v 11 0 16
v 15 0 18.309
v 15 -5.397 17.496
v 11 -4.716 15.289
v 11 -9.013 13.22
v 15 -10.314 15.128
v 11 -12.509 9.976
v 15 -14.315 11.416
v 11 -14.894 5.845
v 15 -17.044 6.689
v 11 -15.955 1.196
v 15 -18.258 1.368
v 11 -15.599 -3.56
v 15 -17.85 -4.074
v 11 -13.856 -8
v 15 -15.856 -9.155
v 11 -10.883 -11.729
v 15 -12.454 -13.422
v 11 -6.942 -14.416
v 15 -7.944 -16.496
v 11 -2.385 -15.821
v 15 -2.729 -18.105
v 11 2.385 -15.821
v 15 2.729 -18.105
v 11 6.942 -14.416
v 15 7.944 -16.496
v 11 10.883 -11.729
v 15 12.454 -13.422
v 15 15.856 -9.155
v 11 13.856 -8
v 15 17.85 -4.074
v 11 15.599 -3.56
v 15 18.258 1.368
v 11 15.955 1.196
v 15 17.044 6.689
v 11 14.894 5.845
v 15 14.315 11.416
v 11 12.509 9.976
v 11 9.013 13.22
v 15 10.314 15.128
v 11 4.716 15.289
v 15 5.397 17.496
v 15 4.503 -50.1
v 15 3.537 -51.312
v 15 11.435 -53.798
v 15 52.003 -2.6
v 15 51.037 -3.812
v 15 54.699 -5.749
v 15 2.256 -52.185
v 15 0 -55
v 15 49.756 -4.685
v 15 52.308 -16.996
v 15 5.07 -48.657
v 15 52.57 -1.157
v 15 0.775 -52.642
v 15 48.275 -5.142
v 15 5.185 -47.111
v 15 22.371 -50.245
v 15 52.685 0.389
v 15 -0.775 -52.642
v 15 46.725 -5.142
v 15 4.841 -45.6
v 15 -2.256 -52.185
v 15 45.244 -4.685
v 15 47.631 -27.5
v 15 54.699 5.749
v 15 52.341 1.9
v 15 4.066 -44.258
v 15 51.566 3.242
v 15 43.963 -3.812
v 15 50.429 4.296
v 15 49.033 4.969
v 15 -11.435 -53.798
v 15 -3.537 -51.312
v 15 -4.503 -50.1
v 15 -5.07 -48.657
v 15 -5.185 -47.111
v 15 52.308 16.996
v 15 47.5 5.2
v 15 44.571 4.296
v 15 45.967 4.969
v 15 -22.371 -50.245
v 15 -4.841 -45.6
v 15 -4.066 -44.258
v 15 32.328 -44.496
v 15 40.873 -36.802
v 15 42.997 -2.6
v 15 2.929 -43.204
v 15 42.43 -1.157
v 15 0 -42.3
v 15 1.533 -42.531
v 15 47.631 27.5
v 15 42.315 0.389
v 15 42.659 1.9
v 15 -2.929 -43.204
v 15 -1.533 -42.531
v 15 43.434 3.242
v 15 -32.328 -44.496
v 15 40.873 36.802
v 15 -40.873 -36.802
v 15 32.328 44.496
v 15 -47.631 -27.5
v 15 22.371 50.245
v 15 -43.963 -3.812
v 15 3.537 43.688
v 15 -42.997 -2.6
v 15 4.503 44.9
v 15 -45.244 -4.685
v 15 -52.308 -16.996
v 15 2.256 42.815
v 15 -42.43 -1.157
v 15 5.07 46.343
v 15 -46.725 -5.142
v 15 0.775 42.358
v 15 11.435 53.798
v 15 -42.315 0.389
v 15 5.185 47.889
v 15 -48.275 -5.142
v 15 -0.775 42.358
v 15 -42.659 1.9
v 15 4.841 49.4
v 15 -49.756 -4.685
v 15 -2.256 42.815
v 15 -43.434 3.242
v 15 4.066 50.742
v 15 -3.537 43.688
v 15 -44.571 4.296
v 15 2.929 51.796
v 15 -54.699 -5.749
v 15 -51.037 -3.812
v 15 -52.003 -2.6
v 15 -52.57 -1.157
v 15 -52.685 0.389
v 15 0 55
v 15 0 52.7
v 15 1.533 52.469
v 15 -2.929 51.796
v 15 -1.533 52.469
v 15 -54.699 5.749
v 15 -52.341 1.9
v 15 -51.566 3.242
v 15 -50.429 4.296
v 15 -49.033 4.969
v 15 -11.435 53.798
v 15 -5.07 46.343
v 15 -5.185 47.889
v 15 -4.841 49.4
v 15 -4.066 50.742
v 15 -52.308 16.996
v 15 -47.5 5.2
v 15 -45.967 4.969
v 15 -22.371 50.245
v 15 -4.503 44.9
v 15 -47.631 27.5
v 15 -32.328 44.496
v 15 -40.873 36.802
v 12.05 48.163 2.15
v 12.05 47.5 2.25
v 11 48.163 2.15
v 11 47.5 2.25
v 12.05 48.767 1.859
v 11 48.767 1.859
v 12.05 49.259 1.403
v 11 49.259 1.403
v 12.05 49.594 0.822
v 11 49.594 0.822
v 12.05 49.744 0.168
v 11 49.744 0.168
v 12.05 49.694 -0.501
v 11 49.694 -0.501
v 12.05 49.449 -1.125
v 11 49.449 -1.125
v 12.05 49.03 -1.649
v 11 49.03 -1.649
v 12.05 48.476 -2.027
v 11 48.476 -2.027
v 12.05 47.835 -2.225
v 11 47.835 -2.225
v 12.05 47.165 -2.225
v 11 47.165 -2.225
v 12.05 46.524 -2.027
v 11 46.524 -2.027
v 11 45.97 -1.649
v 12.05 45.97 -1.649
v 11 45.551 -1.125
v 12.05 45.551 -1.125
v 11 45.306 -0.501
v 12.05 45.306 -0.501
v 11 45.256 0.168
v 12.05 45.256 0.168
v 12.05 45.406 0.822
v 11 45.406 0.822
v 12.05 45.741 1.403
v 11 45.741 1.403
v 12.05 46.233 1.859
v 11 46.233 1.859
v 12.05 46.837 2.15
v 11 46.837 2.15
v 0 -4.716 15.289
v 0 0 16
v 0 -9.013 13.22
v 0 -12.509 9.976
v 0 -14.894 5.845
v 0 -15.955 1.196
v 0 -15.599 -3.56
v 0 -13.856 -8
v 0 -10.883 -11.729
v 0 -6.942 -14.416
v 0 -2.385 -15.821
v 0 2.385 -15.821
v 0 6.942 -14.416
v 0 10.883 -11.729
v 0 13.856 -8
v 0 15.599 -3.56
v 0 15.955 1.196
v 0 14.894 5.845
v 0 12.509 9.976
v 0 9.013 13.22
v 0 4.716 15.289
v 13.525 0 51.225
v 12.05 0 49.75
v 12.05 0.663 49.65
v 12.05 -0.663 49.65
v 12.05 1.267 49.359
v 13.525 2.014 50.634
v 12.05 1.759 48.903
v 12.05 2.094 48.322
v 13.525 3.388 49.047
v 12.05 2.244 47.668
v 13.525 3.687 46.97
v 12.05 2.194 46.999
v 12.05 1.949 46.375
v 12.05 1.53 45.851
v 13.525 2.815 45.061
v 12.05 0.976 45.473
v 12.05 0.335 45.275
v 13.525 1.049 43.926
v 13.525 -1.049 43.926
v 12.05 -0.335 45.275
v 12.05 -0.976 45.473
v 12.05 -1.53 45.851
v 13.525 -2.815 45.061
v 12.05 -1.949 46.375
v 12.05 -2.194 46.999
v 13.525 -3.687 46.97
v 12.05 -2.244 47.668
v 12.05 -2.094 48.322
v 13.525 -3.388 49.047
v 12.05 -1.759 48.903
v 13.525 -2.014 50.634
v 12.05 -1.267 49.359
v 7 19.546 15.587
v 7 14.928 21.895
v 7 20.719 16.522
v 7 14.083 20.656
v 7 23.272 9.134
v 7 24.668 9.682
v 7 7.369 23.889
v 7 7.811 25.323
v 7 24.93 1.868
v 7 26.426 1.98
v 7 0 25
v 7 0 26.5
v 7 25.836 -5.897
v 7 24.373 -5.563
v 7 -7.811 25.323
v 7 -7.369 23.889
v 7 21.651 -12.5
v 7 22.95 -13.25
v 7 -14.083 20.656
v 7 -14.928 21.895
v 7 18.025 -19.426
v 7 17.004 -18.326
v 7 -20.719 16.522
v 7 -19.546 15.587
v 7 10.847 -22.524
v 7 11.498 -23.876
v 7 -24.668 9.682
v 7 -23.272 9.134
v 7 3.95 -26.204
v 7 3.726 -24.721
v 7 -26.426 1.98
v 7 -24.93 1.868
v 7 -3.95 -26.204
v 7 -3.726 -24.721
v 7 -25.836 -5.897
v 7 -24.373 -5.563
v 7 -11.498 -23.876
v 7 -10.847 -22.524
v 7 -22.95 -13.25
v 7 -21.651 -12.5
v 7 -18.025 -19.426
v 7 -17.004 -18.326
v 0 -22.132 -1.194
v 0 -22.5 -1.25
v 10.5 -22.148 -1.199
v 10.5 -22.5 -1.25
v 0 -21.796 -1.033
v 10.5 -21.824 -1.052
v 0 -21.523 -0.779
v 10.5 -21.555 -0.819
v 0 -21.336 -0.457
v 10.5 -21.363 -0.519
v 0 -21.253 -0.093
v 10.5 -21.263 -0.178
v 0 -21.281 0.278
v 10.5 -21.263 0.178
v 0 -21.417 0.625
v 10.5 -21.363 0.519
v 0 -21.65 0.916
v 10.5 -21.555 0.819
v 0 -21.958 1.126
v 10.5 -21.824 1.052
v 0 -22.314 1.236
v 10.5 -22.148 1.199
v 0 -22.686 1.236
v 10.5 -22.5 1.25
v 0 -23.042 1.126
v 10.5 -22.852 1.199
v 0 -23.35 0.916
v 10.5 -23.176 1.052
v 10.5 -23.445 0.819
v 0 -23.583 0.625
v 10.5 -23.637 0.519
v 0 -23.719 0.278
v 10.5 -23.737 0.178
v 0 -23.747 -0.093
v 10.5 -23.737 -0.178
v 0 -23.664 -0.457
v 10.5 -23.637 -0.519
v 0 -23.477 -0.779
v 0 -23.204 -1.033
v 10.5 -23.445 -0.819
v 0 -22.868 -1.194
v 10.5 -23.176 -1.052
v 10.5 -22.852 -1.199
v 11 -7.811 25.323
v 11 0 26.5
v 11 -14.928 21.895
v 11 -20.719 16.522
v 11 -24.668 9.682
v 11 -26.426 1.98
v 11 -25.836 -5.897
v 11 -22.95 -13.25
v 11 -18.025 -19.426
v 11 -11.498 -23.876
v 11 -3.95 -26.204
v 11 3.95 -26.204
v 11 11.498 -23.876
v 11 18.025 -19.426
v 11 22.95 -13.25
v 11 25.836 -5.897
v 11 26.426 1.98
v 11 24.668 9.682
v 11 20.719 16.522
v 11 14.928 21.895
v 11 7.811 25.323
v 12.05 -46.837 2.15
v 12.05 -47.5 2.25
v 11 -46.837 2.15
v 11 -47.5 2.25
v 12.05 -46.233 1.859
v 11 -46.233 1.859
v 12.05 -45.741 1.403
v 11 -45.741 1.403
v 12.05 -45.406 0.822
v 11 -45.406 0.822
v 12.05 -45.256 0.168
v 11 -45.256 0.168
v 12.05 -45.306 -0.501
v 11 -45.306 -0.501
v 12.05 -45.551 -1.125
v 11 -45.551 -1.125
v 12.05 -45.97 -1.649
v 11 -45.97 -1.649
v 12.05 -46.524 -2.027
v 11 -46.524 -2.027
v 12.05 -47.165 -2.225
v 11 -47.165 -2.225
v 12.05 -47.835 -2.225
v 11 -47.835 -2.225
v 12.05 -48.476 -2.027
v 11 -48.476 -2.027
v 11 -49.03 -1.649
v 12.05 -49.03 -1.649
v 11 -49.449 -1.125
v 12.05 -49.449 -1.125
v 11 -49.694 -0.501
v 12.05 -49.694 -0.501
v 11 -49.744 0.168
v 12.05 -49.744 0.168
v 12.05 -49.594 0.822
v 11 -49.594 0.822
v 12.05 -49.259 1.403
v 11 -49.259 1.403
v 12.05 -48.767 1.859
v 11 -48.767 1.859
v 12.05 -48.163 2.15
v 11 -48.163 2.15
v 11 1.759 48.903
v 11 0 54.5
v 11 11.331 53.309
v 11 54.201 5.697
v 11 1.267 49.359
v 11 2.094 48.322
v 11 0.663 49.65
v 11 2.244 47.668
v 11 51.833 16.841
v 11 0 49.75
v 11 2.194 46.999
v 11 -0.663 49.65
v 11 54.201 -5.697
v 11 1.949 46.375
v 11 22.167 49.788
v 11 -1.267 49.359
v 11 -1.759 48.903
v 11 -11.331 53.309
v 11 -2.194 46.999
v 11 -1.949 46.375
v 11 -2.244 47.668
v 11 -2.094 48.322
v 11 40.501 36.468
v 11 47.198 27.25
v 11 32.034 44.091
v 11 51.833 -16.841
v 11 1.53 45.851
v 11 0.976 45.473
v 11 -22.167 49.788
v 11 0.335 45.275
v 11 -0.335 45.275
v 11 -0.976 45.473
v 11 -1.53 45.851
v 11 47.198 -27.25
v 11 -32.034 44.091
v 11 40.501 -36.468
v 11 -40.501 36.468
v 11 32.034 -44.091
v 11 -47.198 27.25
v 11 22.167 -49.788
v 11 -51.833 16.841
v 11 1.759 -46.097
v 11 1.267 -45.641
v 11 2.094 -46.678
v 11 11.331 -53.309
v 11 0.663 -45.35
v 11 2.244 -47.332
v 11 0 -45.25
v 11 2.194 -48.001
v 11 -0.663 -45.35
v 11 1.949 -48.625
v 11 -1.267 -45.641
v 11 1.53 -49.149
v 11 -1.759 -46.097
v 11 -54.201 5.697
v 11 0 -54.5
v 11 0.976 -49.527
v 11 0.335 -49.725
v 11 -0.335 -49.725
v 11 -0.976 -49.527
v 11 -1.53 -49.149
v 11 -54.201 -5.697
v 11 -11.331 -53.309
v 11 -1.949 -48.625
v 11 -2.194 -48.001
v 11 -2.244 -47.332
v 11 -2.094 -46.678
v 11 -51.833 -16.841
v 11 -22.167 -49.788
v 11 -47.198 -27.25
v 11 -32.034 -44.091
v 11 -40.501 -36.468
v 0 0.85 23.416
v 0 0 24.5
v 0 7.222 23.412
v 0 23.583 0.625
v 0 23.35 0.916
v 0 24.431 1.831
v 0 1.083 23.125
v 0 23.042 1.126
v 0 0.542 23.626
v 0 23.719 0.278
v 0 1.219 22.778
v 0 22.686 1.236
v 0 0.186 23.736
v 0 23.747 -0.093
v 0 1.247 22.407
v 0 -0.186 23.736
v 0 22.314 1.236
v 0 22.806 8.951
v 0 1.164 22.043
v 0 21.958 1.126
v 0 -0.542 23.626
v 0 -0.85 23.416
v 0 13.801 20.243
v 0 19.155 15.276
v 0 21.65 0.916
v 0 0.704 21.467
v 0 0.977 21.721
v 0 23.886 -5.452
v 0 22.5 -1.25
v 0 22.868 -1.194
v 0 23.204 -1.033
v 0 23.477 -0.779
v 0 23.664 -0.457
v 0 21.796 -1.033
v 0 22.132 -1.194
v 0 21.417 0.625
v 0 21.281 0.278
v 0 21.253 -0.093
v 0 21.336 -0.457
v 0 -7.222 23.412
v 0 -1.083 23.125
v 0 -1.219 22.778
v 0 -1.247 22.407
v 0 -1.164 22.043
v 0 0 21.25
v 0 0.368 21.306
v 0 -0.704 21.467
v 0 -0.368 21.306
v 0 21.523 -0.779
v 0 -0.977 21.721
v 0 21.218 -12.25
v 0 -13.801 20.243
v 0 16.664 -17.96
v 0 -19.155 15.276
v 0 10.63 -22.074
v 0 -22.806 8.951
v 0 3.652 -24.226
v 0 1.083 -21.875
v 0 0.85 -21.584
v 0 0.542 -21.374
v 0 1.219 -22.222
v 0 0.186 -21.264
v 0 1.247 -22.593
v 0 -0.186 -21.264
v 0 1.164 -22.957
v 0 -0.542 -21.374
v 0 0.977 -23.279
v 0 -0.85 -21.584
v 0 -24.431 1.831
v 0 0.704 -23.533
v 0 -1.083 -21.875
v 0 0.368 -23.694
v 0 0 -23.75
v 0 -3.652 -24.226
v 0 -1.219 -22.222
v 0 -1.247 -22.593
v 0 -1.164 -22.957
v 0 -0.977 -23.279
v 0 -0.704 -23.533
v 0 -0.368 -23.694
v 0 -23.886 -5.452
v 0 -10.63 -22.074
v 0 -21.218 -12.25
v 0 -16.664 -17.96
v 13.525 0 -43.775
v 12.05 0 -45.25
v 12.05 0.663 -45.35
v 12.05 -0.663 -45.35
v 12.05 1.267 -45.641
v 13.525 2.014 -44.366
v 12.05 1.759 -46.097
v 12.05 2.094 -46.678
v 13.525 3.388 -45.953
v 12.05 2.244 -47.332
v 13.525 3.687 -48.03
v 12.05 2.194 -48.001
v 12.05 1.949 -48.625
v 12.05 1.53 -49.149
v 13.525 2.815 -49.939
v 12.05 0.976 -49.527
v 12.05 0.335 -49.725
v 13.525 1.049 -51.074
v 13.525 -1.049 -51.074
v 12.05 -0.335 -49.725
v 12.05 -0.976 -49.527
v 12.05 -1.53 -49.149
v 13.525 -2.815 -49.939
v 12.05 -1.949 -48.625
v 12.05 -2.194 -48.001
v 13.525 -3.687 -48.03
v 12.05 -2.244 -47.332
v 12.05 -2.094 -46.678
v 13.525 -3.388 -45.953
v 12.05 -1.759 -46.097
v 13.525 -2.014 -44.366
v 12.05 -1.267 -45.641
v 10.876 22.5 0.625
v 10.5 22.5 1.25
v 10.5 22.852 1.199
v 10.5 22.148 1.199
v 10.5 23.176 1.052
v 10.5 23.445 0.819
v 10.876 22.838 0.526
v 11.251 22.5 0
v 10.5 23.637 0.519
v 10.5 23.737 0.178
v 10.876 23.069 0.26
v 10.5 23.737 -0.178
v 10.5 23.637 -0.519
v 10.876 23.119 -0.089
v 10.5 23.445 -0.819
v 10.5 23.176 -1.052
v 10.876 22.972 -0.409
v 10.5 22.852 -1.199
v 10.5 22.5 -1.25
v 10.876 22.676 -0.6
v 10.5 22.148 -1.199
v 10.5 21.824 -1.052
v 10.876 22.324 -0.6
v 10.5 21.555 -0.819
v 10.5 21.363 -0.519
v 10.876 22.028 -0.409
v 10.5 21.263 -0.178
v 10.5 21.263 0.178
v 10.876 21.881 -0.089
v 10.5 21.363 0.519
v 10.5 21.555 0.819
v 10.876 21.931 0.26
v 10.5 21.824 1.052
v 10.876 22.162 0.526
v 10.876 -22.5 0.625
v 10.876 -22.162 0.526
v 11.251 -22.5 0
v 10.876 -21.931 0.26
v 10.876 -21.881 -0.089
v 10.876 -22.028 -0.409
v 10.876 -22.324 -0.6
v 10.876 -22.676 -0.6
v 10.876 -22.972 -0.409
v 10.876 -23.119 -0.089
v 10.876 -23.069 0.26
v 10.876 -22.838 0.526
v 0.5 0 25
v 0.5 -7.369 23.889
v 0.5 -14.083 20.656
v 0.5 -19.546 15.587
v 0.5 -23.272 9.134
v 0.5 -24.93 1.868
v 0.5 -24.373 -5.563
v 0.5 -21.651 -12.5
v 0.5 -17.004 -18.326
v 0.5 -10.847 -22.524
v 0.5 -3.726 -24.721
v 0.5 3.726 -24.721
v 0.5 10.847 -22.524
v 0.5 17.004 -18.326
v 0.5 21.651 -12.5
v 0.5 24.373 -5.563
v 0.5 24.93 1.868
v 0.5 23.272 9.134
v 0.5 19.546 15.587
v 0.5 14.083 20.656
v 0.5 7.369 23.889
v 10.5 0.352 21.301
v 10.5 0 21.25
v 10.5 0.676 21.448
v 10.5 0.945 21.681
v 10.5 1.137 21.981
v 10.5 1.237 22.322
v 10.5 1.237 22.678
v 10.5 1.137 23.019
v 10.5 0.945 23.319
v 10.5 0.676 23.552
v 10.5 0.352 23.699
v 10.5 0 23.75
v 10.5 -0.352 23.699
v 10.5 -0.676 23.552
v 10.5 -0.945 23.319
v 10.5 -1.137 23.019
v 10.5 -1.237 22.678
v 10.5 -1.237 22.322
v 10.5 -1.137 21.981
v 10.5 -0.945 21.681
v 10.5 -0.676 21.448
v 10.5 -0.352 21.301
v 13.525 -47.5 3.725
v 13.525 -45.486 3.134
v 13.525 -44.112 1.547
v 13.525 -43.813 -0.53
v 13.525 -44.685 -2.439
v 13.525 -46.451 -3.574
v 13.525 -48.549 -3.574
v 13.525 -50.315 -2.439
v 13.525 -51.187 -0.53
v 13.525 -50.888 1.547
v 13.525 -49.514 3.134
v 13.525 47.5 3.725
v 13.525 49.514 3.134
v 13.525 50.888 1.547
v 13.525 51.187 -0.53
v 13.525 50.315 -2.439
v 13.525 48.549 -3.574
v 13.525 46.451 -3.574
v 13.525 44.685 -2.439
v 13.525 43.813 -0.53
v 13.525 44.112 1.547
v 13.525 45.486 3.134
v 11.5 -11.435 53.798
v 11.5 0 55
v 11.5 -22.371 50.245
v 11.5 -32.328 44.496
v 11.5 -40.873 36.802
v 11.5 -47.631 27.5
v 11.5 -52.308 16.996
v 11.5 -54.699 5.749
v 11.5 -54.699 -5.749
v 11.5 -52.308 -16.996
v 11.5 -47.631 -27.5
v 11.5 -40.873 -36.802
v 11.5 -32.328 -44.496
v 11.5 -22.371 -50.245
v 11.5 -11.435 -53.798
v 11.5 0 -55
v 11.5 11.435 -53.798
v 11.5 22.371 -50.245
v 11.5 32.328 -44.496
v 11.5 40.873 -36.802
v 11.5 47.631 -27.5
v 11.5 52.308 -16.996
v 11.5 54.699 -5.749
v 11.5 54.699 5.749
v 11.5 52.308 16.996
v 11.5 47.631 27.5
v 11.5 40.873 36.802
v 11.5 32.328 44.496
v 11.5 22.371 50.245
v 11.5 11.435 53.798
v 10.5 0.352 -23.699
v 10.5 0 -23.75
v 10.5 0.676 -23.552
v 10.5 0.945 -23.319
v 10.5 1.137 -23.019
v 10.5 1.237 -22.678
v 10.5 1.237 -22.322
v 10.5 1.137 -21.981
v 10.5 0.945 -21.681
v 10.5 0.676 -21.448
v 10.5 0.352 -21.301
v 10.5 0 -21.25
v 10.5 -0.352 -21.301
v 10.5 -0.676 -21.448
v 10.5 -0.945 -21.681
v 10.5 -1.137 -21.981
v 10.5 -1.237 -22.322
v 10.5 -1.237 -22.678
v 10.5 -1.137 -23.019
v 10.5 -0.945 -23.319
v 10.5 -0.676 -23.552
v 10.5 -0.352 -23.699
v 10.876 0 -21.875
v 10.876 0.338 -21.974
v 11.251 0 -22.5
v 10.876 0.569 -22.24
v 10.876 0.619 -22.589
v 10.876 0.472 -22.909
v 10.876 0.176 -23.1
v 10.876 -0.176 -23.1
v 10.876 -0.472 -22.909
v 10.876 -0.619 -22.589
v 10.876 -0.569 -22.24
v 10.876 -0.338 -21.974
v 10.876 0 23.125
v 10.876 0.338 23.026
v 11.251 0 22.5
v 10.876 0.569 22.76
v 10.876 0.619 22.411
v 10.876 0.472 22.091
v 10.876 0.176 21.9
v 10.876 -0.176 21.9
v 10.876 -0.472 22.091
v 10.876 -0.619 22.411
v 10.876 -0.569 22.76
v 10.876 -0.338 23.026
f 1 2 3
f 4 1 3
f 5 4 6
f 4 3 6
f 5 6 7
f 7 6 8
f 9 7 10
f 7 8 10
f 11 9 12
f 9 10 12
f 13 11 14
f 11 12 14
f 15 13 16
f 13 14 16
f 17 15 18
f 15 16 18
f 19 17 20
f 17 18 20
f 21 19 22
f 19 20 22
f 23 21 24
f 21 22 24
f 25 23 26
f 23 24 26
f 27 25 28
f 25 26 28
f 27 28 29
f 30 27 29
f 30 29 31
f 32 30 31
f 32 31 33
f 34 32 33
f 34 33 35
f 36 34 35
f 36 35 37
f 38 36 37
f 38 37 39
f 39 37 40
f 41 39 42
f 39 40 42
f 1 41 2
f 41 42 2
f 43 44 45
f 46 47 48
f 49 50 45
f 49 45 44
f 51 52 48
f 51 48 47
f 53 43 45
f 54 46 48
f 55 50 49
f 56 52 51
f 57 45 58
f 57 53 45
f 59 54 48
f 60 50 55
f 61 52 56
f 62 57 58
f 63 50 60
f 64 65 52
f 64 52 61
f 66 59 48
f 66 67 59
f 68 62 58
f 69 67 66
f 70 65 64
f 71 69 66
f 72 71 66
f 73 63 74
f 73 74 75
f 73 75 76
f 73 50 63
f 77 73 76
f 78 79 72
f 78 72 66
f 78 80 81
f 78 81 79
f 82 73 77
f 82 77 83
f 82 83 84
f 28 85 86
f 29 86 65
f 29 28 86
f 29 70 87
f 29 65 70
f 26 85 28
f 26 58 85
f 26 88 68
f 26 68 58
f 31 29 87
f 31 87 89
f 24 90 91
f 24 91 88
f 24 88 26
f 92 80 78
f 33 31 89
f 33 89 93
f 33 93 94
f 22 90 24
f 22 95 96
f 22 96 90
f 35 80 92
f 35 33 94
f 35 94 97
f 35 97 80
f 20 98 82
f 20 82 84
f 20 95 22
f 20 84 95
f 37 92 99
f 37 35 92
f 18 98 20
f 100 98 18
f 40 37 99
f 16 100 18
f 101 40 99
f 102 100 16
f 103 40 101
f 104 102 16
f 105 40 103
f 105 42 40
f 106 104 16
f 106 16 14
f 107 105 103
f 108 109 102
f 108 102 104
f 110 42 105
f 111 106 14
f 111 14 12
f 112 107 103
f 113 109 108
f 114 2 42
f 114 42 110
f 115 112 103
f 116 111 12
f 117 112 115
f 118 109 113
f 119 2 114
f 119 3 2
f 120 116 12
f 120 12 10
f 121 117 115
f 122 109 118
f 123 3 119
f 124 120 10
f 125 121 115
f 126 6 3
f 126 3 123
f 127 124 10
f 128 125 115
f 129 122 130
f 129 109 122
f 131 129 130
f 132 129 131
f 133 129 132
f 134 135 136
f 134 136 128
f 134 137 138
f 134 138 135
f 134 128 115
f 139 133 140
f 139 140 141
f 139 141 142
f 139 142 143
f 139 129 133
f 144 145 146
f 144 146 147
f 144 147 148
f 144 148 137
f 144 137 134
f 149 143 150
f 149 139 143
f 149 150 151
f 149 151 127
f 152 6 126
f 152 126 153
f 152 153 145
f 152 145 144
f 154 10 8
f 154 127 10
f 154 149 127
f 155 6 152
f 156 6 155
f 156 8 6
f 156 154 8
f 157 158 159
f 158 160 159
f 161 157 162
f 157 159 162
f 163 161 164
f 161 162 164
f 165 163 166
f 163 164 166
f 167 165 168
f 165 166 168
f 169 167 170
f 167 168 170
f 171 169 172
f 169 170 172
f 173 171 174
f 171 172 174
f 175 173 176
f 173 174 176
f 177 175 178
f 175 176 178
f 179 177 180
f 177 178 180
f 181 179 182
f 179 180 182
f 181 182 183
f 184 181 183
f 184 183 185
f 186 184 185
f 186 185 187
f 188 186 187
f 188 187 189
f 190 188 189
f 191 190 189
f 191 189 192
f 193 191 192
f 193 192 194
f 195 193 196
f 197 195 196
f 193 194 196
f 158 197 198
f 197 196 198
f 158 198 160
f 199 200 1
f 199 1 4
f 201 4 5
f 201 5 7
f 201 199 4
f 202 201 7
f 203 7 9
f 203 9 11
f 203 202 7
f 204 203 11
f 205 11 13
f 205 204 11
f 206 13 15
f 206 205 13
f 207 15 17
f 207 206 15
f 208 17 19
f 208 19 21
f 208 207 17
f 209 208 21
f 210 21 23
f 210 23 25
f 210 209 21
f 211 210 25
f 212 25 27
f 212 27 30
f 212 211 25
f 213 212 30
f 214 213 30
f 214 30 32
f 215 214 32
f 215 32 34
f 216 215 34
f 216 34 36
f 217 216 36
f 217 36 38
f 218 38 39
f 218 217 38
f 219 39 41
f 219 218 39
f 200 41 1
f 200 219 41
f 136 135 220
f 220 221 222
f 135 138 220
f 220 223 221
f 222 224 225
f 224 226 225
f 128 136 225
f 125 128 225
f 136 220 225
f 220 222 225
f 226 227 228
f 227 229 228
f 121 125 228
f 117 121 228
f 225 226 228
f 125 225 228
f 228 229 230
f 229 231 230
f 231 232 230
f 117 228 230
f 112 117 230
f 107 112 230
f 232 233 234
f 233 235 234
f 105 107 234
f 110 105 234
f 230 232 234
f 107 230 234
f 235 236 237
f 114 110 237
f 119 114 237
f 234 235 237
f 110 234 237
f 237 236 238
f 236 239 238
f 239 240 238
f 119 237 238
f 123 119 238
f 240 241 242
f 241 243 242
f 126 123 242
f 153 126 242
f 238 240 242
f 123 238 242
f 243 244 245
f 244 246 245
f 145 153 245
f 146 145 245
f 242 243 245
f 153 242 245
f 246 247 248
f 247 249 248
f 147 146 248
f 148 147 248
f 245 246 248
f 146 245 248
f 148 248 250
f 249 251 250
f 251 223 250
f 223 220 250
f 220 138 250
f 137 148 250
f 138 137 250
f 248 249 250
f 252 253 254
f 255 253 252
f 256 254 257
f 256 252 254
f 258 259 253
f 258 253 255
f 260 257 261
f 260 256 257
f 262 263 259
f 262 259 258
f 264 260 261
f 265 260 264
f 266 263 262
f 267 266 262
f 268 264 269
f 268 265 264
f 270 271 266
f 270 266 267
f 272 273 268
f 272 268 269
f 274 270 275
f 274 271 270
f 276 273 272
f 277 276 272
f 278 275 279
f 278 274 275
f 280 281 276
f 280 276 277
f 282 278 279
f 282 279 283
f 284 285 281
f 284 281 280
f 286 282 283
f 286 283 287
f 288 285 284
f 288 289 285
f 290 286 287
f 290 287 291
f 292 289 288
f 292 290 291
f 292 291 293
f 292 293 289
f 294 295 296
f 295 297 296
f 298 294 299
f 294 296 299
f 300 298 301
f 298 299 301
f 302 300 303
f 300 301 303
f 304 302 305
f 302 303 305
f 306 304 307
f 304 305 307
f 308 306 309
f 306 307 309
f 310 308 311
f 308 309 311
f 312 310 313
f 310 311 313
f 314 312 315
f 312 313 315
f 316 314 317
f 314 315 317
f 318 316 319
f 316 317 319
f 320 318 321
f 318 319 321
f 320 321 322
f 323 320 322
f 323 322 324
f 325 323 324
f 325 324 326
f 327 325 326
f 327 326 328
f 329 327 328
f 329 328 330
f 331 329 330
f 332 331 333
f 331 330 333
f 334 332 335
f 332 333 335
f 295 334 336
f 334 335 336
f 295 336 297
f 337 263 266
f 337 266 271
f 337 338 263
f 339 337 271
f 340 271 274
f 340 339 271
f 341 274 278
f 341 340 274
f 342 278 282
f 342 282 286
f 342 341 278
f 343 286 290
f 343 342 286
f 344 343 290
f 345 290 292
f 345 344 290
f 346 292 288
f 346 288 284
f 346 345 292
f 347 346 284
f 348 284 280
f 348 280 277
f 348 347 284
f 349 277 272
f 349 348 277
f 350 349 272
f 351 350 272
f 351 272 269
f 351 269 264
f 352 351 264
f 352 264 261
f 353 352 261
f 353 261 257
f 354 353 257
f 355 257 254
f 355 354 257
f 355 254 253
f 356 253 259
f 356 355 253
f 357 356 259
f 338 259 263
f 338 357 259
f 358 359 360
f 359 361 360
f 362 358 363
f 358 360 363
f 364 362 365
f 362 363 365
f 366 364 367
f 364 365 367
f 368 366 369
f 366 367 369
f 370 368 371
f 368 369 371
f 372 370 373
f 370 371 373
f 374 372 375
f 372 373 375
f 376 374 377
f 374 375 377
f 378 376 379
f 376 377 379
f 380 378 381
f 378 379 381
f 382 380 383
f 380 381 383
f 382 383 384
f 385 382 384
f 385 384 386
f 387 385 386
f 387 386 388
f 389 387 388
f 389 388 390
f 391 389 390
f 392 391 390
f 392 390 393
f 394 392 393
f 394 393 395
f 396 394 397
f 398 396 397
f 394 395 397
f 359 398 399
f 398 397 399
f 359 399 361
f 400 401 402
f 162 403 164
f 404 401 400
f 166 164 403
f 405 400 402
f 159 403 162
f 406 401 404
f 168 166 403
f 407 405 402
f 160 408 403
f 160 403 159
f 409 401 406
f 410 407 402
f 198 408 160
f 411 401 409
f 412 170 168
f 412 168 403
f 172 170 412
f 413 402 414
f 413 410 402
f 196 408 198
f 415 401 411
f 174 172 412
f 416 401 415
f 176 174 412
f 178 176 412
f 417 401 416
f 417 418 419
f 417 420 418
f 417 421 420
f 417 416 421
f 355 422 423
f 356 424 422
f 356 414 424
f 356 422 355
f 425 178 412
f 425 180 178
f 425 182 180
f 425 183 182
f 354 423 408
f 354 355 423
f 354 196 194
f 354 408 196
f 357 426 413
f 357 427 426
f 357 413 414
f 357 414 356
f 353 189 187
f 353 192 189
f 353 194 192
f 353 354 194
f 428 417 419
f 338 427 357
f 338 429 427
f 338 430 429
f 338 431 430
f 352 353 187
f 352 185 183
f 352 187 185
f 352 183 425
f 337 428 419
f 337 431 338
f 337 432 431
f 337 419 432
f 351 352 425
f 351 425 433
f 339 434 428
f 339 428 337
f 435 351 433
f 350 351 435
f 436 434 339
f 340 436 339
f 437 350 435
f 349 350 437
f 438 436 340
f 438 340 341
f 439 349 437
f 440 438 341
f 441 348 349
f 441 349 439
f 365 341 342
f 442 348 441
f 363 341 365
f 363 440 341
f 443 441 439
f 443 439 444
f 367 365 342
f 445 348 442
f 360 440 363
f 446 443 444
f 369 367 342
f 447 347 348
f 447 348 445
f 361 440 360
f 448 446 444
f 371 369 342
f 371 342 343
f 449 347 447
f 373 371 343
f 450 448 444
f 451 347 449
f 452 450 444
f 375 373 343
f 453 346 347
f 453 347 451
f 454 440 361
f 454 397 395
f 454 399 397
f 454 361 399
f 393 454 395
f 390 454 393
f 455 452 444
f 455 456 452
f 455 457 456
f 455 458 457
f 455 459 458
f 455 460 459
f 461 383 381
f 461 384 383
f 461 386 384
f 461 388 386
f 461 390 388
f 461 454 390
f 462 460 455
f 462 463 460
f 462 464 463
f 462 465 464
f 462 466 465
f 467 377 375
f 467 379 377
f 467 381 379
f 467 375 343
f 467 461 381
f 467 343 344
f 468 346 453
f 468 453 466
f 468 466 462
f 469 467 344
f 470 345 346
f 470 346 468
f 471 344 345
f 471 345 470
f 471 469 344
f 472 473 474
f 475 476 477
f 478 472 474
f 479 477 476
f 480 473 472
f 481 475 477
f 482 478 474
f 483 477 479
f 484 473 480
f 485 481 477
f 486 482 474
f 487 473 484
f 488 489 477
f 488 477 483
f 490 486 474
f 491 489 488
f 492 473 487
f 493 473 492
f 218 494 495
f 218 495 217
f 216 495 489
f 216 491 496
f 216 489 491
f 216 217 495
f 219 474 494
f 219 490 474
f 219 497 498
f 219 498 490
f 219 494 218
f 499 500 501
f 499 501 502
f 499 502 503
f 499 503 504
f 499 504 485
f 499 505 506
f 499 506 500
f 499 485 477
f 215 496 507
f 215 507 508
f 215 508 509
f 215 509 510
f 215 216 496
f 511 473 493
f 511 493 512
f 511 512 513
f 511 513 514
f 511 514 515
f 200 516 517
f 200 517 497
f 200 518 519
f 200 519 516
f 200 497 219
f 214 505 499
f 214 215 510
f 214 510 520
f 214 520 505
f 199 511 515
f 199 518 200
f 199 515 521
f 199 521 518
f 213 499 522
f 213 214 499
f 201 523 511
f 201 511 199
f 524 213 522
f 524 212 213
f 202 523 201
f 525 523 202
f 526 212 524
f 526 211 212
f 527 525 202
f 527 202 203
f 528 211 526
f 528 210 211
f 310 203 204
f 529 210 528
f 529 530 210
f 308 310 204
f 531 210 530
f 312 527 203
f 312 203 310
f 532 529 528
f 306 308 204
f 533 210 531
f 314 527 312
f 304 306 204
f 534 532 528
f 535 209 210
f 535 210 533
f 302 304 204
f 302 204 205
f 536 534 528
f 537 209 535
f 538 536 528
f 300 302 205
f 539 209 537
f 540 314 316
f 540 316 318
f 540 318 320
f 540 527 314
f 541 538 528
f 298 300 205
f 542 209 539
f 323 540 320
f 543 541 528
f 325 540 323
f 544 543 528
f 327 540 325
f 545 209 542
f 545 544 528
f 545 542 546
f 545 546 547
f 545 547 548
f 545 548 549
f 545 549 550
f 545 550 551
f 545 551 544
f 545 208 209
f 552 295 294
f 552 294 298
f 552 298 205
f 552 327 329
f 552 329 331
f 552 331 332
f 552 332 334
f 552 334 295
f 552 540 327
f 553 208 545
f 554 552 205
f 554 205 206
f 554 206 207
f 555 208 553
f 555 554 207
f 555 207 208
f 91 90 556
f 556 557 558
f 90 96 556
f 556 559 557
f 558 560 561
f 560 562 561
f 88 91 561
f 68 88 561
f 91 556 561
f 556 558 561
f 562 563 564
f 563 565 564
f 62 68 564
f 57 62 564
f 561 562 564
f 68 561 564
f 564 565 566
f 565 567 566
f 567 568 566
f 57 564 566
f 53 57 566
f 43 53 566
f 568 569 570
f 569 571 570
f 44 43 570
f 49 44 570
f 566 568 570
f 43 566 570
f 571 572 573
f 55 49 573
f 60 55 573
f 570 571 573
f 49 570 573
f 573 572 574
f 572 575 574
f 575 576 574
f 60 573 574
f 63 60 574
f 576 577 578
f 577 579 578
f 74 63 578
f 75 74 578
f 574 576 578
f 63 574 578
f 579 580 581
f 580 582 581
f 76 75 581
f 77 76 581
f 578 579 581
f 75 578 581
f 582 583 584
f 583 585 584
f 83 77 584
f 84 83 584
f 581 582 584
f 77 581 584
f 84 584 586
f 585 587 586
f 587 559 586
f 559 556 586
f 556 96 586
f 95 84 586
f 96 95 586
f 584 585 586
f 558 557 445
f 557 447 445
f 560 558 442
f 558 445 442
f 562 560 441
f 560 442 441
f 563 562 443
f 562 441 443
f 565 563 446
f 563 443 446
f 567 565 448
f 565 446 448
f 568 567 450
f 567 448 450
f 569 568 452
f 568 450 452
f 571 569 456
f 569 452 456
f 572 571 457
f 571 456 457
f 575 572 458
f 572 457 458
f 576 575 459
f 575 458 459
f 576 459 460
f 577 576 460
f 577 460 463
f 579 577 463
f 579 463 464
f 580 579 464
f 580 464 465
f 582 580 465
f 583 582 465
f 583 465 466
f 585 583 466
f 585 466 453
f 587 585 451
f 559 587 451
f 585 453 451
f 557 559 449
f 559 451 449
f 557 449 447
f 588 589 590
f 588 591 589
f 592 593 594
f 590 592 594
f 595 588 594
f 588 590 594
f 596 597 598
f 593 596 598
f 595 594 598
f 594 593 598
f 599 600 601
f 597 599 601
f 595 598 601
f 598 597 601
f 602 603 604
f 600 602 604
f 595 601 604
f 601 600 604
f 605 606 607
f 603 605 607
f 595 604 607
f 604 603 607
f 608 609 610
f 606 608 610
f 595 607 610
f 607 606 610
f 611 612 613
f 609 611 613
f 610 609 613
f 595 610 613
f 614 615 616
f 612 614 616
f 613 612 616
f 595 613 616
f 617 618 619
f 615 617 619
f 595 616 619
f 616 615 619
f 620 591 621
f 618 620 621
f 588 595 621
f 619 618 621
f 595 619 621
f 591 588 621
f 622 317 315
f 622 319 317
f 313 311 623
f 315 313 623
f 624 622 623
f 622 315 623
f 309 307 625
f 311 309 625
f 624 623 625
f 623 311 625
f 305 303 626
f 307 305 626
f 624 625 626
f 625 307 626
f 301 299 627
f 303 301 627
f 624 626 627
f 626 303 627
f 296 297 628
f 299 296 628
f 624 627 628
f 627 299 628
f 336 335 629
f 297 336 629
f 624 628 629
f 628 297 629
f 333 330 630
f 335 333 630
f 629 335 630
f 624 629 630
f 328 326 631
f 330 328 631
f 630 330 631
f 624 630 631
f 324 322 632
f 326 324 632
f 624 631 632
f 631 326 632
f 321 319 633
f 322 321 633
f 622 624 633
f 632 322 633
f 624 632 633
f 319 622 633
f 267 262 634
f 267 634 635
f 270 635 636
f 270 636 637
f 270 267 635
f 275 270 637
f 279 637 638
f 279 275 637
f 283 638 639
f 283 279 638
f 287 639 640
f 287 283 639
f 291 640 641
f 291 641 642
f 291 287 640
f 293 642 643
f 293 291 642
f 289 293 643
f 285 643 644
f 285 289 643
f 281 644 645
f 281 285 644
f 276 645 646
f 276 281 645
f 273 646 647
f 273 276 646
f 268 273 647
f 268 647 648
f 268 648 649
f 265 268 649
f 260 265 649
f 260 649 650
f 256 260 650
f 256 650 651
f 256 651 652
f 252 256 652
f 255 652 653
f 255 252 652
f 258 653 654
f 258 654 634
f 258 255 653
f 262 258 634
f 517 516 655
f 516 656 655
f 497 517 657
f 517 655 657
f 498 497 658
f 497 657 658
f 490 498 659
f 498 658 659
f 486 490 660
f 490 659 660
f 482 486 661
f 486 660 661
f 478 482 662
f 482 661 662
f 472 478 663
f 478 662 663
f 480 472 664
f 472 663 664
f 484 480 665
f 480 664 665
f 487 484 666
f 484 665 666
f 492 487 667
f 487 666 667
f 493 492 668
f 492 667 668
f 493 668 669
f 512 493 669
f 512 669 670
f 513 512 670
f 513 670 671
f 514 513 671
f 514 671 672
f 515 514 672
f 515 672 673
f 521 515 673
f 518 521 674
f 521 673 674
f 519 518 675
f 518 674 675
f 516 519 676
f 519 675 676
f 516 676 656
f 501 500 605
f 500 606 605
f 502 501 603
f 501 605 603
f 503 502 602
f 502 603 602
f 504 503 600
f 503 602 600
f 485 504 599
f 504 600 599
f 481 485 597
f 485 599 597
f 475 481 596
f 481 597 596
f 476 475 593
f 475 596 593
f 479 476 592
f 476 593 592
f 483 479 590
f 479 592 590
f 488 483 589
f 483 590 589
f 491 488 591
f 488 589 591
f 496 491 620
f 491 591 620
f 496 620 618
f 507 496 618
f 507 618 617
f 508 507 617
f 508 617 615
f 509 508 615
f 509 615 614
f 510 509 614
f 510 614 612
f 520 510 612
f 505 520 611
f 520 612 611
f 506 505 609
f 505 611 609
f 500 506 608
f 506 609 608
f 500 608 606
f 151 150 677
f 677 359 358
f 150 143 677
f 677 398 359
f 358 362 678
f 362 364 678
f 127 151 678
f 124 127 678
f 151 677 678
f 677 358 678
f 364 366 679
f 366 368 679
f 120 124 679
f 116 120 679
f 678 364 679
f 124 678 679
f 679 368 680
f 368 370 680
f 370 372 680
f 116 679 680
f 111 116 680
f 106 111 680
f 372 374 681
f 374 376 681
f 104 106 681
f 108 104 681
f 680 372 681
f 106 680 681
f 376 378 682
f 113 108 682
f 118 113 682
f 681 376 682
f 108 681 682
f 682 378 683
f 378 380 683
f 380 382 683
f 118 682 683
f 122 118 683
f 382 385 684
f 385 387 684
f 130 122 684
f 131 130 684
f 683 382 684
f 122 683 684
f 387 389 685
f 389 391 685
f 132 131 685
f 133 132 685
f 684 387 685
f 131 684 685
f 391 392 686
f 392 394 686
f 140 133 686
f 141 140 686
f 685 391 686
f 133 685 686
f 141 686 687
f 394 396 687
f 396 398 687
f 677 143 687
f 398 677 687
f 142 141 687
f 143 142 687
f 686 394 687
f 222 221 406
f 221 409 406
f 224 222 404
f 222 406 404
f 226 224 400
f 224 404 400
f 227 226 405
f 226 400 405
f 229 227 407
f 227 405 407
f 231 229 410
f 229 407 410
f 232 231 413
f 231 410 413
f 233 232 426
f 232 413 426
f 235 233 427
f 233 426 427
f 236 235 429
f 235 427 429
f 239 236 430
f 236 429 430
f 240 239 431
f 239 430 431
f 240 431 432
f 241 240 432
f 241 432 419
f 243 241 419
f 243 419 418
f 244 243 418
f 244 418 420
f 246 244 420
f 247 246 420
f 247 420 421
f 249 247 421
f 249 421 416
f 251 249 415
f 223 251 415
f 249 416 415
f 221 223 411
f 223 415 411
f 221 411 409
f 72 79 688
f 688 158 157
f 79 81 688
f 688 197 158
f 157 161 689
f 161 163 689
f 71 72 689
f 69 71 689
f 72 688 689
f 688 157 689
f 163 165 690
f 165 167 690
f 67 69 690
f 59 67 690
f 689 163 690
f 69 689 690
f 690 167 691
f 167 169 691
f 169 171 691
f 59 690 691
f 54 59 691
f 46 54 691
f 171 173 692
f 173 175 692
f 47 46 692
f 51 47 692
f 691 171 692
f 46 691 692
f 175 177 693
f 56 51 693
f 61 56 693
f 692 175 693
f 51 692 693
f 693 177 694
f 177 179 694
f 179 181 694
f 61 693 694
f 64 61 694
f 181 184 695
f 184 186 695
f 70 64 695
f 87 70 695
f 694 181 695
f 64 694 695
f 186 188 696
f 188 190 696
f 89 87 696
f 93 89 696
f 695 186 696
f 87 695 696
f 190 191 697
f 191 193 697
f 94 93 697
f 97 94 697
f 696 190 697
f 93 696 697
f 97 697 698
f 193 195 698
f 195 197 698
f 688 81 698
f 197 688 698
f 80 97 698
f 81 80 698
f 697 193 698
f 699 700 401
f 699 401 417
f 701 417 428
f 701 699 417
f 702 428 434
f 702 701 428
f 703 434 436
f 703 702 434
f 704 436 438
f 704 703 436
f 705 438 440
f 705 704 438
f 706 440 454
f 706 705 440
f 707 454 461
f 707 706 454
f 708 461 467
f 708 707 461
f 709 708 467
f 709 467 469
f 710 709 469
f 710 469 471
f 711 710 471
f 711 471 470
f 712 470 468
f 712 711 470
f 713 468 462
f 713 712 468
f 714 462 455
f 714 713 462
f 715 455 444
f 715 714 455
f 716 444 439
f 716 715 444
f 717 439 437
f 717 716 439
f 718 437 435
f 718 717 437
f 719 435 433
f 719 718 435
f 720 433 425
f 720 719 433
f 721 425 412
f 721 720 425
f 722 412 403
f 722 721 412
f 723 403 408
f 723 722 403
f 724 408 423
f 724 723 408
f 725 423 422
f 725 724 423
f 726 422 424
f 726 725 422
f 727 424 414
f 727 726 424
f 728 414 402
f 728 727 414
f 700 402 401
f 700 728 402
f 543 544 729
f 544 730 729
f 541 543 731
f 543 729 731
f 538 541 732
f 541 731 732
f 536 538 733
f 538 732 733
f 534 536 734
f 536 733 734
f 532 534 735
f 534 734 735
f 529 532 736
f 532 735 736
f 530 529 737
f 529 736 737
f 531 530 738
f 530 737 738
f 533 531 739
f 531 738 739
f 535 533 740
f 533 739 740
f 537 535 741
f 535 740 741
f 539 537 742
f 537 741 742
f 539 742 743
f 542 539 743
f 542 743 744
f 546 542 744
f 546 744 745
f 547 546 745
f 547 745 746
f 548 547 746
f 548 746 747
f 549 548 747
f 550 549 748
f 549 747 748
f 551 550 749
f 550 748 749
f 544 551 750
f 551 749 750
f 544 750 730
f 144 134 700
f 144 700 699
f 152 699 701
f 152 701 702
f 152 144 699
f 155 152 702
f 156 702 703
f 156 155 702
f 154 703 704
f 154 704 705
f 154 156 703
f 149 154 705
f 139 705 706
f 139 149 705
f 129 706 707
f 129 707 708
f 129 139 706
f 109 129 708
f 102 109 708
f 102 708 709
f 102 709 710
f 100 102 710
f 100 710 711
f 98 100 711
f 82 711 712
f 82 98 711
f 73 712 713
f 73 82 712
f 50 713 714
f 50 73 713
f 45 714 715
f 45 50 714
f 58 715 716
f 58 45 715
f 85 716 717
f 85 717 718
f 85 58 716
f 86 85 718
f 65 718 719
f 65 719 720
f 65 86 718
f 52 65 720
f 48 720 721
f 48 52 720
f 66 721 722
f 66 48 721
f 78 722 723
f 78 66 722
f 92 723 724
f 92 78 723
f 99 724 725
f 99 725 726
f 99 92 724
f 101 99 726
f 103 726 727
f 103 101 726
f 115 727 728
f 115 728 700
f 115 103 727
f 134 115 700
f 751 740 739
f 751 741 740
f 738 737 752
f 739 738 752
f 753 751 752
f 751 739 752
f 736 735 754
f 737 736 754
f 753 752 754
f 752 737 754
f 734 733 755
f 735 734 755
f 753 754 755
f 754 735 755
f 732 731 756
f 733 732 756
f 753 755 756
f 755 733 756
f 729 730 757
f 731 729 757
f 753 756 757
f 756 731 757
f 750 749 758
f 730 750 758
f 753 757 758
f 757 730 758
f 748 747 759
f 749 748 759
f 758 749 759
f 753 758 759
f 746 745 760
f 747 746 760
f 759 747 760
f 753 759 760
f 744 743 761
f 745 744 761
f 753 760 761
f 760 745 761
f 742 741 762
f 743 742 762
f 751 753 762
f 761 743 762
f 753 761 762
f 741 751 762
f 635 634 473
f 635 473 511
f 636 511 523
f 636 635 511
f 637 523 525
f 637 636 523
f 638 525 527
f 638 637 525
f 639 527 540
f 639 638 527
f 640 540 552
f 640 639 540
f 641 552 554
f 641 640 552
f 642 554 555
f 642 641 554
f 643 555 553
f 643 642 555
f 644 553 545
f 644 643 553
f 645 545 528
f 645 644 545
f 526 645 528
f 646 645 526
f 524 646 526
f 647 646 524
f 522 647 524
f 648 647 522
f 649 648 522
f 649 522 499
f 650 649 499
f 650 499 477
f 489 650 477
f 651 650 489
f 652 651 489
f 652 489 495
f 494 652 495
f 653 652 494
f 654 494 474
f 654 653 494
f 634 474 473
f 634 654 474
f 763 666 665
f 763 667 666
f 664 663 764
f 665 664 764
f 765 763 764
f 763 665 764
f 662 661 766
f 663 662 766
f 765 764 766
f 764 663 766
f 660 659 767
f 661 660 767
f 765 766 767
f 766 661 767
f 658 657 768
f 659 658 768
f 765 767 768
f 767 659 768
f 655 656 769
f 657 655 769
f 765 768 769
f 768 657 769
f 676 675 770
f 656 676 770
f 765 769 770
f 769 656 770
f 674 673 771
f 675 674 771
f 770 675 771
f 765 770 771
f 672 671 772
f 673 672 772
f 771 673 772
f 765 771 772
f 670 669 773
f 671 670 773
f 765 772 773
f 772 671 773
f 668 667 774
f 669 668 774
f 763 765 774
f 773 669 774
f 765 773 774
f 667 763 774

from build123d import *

# Parameters (mm, degrees)
FRAISAGE_POUR_VIS_T_TE_FRAIS_E_M42_D           = 4.5
FRAISAGE_POUR_VIS_T_TE_FRAIS_E_M42_CSINK_D     = 10.4
FRAISAGE_POUR_VIS_T_TE_FRAIS_E_M42_CSINK_ANGLE = 90
CHANFREIN1_SIZE                                = 0.5
TROU_TARAUD_M32_D                              = 2.5
TROU_TARAUD_M32_DEPTH                          = 10.5
TROU_TARAUD_M32_TIP                            = 0.751075774
CHANFREIN2_SIZE                                = 4
CHANFREIN2_SIZE2                               = 2.309401077


with BuildPart() as part:
    # Esquisse1 → Révolution1 (revolve)
    with BuildSketch(Plane.XY, mode=Mode.PRIVATE) as r_volution1_sk:
        Polygon((0, 16), (0, 25), (7, 25), (7, 26.5), (11, 26.5), (11, 55), (15, 55), (15, 16), align=None)
    revolve(r_volution1_sk.sketch.rotate(Axis((0, 0, 0), (1, 0, 0)), 90), axis=Axis((0, 0, 0), (1, 0, 0)))

    # Fraisage pour vis à tête fraisée M42 (through all)
    with Locations(Plane(origin=(15, 0, 0), x_dir=(0, 0, -1), z_dir=(1, 0, 0))):
        with Locations((0, 47.5), (47.5, 0), (0, -47.5), (-47.5, 0)):
            CounterSinkHole(FRAISAGE_POUR_VIS_T_TE_FRAIS_E_M42_D / 2, FRAISAGE_POUR_VIS_T_TE_FRAIS_E_M42_CSINK_D / 2, counter_sink_angle=FRAISAGE_POUR_VIS_T_TE_FRAIS_E_M42_CSINK_ANGLE)

    # Chanfrein1
    chanfrein1_edges = [part.edges().sort_by_distance(p)[0] for p in [
        (11, 0, -55),
        (0, 0, -25),
    ]]
    chamfer(chanfrein1_edges, length=CHANFREIN1_SIZE)

    # Trou taraudé M32
    with Locations(Plane.ZY):
        with Locations((0, 22.5), (-22.5, 0), (0, -22.5), (22.5, 0)):
            Hole(TROU_TARAUD_M32_D / 2, depth=TROU_TARAUD_M32_DEPTH)
            with Locations((0, 0, -(TROU_TARAUD_M32_DEPTH + TROU_TARAUD_M32_TIP / 2))):  # 118° drill point
                Cone(0, TROU_TARAUD_M32_D / 2, TROU_TARAUD_M32_TIP, mode=Mode.SUBTRACT)

    # Chanfrein2
    chanfrein2_edges = [part.edges().sort_by_distance(p)[0] for p in [
        (15, 0, -16),
    ]]
    chanfrein2_side = [part.faces().sort_by_distance(p)[0] for p in [
        (7.5, 0, -16),
    ]]
    chamfer(chanfrein2_edges, length=CHANFREIN2_SIZE, length2=CHANFREIN2_SIZE2, reference=chanfrein2_side[0])


solid = part.part
